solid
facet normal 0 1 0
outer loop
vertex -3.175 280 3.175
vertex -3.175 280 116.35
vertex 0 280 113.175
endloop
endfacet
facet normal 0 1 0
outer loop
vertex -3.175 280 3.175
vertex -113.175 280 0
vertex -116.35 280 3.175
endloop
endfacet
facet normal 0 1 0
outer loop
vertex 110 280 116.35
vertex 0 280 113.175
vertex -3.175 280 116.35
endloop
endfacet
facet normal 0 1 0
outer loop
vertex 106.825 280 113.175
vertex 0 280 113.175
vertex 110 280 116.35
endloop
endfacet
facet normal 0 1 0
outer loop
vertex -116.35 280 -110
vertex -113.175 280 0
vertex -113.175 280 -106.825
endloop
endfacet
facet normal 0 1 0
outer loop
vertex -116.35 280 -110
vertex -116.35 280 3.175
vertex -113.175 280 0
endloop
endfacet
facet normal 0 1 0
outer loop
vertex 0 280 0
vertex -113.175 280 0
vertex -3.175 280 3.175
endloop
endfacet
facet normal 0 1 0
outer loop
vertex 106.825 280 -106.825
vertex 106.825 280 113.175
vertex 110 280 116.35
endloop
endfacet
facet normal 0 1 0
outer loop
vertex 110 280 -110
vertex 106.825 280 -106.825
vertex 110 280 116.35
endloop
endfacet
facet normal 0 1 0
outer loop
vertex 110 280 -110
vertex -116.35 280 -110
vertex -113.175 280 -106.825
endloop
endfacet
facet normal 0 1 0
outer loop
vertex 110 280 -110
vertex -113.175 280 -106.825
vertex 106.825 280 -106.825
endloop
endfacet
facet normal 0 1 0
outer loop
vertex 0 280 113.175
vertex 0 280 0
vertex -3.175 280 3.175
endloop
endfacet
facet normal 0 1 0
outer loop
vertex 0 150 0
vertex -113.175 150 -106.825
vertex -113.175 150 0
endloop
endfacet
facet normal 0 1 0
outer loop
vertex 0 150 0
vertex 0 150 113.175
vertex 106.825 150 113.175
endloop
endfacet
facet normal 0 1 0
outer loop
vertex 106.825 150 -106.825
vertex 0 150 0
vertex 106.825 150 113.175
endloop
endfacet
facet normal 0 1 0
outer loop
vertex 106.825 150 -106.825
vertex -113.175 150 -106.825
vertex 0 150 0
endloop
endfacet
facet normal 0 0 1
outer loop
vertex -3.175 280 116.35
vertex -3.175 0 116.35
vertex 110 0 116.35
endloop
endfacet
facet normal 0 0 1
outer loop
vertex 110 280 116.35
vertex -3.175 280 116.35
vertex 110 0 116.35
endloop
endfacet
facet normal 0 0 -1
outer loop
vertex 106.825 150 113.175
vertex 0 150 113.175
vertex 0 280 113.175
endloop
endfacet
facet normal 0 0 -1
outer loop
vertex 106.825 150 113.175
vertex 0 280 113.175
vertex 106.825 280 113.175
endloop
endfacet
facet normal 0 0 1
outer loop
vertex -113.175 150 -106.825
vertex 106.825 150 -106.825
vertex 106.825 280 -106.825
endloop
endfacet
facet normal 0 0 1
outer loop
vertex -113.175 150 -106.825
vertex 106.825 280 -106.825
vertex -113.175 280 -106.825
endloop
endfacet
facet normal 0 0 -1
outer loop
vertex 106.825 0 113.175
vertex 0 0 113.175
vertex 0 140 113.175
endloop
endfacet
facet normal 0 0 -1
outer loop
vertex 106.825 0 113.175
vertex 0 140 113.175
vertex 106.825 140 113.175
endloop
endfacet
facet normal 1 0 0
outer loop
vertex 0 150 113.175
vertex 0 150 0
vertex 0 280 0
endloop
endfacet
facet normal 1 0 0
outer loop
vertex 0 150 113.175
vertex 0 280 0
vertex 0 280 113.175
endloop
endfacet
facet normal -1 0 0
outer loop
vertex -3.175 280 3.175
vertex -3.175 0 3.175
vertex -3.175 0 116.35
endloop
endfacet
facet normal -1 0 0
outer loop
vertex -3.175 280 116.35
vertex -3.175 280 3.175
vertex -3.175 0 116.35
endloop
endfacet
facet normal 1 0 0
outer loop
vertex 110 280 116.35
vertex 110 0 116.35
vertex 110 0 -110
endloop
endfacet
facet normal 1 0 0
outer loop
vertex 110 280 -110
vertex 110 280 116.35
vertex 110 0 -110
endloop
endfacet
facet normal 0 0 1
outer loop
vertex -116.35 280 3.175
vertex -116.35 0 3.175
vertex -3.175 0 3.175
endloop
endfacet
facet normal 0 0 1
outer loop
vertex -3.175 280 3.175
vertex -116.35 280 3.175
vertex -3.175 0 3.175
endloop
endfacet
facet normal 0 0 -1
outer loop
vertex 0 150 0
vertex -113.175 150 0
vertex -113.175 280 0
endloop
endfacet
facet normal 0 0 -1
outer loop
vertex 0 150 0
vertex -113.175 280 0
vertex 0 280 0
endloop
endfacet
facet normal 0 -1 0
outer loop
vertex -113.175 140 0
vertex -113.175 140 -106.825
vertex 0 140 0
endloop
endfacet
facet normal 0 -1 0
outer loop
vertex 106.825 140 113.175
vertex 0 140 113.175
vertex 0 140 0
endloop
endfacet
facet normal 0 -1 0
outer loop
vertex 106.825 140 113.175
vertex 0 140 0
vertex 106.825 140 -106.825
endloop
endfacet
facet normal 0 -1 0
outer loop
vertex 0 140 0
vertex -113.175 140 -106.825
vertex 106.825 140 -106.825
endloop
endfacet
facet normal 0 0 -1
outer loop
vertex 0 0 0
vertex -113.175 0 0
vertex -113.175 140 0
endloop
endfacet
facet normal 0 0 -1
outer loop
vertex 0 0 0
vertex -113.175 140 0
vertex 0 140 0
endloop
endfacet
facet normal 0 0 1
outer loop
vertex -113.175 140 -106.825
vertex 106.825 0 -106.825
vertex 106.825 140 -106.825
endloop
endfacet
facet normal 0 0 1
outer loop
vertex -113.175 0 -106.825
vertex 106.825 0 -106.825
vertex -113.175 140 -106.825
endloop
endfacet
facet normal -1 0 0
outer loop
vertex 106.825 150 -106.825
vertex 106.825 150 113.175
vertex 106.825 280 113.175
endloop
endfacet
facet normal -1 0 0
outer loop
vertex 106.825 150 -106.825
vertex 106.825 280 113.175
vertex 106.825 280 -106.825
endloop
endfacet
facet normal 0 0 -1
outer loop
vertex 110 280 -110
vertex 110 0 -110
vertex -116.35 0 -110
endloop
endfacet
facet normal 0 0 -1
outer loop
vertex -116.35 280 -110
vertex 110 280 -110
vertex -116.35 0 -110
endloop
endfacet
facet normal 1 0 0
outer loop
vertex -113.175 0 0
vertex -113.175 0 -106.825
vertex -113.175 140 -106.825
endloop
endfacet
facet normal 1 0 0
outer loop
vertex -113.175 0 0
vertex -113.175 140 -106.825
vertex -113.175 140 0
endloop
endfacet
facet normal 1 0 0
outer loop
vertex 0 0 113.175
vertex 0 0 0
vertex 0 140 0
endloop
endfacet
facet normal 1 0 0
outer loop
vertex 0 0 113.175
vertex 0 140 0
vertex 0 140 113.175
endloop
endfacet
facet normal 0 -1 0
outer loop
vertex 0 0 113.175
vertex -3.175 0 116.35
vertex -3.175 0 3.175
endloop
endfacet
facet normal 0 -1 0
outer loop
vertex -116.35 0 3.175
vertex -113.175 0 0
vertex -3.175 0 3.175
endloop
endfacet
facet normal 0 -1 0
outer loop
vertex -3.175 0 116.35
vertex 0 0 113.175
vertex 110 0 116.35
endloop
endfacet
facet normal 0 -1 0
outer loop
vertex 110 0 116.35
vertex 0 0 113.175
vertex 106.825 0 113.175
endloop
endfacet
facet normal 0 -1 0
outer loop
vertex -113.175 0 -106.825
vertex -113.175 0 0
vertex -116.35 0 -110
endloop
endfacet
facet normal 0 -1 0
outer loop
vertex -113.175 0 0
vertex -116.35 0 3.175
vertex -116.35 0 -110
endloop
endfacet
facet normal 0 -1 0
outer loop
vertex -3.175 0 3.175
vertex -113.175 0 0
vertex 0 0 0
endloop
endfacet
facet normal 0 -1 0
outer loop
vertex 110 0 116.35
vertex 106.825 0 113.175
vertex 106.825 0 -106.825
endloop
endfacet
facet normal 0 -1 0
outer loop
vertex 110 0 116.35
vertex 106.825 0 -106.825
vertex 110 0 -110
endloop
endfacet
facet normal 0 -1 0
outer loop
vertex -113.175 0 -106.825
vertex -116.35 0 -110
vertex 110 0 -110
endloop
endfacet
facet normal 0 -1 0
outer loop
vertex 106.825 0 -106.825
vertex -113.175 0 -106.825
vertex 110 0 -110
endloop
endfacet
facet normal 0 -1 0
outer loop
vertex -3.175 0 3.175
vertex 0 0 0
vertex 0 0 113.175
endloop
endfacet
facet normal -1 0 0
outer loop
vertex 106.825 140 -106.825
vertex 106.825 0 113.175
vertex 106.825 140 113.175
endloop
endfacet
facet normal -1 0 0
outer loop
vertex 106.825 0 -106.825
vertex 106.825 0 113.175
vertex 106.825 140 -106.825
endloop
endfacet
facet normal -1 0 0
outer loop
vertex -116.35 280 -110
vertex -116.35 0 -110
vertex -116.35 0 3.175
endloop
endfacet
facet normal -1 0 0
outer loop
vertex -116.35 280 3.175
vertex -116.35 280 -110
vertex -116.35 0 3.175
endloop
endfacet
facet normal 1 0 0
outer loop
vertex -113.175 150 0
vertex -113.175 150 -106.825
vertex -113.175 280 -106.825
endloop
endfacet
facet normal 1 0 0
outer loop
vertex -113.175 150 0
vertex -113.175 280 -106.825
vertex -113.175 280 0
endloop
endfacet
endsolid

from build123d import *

# Parameters (mm, degrees)
BOSS_EXTRUDE1_DEPTH = 280
BOSS_EXTRUDE2_START = 140
BOSS_EXTRUDE2_DEPTH = 10


with BuildPart() as part:
    # Sketch1 → Boss-Extrude1 (new body)
    with BuildSketch(Plane(origin=(0, 0, 0), x_dir=(1, 0, 0), z_dir=(0, 1, 0))):
        Polygon((-116.35, -3.175), (-3.175, -3.175), (-3.175, -116.35), (110, -116.35), (110, 110), (-116.35, 110), align=None)
        Polygon((-113.175, 0), (0, 0), (0, -113.175), (106.825, -113.175), (106.825, 106.825), (-113.175, 106.825), align=None, mode=Mode.SUBTRACT)
    extrude(amount=BOSS_EXTRUDE1_DEPTH)

    # Sketch2 → Boss-Extrude2 (add)
    with BuildSketch(Plane(origin=(0, 0, 0), x_dir=(1, 0, 0), z_dir=(0, 1, 0)).offset(BOSS_EXTRUDE2_START)):
        Polygon((-113.175, 106.825), (-113.175, 0), (0, 0), (0, -113.175), (106.825, -113.175), (106.825, 106.825), align=None)
    extrude(amount=BOSS_EXTRUDE2_DEPTH)


solid = part.part
